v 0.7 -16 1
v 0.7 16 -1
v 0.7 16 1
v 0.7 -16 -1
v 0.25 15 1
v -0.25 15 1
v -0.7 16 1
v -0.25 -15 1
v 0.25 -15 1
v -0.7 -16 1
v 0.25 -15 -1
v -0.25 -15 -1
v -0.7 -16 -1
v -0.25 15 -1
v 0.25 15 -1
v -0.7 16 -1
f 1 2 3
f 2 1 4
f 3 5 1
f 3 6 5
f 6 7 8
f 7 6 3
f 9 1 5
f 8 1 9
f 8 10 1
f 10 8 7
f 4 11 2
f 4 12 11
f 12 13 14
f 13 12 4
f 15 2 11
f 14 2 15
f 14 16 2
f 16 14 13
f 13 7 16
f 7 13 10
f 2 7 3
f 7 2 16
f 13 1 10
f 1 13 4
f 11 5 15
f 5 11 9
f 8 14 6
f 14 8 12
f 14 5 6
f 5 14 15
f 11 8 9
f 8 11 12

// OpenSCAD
// file: consts.scad
STRIPE_X = 3.4; //width of the LED stripe pcb
STRIPE_Y = 48.5; //length of LED stripe pcb
STRIPE_Z = 0.6; //pcb thickness of LED stripe pcb
LED_X=2; //edge length of LED (assumed to be square)
LED_Z = 1; //LED height above PCB

FIL_D = 0.25; //fiber diameter
NOZ_D = 0.4; //nozzle diameter
CLIP_Z = 5; //height of clip
N = 64; //number of fibers

D_I = 11.6; //inner diameter of pen
D_O = D_I+4*NOZ_D; //outer diameter of pen

CLIP_X = 2*FIL_D+4*NOZ_D;
CLIP_L = 2*N*FIL_D+4*NOZ_D;

CAP_H = 3; //height of cap cylinder attached to clip

PEN_UPPER_Z = 60; //height of upper pen part 
PEN_LOWER_BODY_Z = 60; //height of the cylindrical part
PEN_LOWER_TIP_Z = 20; //height of the tip cone

FIBER_CLAMP_Z = 2;
FIBER_CLAMP_X = 1.2;

STRIPE_JOINER_Z = 3; //height of the 4stripe joiner
// main file
include <consts.scad>;

//Clamp that clamps all fibers together.
//This should be glued into the pen's clip from behind (after the fibers are glued into this clamp)
//
//Print this with flexible PLA

difference() {
    cube([FIBER_CLAMP_X+0.2, 2*N*FIL_D, FIBER_CLAMP_Z], center=true);
    cube([2*FIL_D, 2*N*FIL_D-2, CLIP_Z+2], center=true);
}
